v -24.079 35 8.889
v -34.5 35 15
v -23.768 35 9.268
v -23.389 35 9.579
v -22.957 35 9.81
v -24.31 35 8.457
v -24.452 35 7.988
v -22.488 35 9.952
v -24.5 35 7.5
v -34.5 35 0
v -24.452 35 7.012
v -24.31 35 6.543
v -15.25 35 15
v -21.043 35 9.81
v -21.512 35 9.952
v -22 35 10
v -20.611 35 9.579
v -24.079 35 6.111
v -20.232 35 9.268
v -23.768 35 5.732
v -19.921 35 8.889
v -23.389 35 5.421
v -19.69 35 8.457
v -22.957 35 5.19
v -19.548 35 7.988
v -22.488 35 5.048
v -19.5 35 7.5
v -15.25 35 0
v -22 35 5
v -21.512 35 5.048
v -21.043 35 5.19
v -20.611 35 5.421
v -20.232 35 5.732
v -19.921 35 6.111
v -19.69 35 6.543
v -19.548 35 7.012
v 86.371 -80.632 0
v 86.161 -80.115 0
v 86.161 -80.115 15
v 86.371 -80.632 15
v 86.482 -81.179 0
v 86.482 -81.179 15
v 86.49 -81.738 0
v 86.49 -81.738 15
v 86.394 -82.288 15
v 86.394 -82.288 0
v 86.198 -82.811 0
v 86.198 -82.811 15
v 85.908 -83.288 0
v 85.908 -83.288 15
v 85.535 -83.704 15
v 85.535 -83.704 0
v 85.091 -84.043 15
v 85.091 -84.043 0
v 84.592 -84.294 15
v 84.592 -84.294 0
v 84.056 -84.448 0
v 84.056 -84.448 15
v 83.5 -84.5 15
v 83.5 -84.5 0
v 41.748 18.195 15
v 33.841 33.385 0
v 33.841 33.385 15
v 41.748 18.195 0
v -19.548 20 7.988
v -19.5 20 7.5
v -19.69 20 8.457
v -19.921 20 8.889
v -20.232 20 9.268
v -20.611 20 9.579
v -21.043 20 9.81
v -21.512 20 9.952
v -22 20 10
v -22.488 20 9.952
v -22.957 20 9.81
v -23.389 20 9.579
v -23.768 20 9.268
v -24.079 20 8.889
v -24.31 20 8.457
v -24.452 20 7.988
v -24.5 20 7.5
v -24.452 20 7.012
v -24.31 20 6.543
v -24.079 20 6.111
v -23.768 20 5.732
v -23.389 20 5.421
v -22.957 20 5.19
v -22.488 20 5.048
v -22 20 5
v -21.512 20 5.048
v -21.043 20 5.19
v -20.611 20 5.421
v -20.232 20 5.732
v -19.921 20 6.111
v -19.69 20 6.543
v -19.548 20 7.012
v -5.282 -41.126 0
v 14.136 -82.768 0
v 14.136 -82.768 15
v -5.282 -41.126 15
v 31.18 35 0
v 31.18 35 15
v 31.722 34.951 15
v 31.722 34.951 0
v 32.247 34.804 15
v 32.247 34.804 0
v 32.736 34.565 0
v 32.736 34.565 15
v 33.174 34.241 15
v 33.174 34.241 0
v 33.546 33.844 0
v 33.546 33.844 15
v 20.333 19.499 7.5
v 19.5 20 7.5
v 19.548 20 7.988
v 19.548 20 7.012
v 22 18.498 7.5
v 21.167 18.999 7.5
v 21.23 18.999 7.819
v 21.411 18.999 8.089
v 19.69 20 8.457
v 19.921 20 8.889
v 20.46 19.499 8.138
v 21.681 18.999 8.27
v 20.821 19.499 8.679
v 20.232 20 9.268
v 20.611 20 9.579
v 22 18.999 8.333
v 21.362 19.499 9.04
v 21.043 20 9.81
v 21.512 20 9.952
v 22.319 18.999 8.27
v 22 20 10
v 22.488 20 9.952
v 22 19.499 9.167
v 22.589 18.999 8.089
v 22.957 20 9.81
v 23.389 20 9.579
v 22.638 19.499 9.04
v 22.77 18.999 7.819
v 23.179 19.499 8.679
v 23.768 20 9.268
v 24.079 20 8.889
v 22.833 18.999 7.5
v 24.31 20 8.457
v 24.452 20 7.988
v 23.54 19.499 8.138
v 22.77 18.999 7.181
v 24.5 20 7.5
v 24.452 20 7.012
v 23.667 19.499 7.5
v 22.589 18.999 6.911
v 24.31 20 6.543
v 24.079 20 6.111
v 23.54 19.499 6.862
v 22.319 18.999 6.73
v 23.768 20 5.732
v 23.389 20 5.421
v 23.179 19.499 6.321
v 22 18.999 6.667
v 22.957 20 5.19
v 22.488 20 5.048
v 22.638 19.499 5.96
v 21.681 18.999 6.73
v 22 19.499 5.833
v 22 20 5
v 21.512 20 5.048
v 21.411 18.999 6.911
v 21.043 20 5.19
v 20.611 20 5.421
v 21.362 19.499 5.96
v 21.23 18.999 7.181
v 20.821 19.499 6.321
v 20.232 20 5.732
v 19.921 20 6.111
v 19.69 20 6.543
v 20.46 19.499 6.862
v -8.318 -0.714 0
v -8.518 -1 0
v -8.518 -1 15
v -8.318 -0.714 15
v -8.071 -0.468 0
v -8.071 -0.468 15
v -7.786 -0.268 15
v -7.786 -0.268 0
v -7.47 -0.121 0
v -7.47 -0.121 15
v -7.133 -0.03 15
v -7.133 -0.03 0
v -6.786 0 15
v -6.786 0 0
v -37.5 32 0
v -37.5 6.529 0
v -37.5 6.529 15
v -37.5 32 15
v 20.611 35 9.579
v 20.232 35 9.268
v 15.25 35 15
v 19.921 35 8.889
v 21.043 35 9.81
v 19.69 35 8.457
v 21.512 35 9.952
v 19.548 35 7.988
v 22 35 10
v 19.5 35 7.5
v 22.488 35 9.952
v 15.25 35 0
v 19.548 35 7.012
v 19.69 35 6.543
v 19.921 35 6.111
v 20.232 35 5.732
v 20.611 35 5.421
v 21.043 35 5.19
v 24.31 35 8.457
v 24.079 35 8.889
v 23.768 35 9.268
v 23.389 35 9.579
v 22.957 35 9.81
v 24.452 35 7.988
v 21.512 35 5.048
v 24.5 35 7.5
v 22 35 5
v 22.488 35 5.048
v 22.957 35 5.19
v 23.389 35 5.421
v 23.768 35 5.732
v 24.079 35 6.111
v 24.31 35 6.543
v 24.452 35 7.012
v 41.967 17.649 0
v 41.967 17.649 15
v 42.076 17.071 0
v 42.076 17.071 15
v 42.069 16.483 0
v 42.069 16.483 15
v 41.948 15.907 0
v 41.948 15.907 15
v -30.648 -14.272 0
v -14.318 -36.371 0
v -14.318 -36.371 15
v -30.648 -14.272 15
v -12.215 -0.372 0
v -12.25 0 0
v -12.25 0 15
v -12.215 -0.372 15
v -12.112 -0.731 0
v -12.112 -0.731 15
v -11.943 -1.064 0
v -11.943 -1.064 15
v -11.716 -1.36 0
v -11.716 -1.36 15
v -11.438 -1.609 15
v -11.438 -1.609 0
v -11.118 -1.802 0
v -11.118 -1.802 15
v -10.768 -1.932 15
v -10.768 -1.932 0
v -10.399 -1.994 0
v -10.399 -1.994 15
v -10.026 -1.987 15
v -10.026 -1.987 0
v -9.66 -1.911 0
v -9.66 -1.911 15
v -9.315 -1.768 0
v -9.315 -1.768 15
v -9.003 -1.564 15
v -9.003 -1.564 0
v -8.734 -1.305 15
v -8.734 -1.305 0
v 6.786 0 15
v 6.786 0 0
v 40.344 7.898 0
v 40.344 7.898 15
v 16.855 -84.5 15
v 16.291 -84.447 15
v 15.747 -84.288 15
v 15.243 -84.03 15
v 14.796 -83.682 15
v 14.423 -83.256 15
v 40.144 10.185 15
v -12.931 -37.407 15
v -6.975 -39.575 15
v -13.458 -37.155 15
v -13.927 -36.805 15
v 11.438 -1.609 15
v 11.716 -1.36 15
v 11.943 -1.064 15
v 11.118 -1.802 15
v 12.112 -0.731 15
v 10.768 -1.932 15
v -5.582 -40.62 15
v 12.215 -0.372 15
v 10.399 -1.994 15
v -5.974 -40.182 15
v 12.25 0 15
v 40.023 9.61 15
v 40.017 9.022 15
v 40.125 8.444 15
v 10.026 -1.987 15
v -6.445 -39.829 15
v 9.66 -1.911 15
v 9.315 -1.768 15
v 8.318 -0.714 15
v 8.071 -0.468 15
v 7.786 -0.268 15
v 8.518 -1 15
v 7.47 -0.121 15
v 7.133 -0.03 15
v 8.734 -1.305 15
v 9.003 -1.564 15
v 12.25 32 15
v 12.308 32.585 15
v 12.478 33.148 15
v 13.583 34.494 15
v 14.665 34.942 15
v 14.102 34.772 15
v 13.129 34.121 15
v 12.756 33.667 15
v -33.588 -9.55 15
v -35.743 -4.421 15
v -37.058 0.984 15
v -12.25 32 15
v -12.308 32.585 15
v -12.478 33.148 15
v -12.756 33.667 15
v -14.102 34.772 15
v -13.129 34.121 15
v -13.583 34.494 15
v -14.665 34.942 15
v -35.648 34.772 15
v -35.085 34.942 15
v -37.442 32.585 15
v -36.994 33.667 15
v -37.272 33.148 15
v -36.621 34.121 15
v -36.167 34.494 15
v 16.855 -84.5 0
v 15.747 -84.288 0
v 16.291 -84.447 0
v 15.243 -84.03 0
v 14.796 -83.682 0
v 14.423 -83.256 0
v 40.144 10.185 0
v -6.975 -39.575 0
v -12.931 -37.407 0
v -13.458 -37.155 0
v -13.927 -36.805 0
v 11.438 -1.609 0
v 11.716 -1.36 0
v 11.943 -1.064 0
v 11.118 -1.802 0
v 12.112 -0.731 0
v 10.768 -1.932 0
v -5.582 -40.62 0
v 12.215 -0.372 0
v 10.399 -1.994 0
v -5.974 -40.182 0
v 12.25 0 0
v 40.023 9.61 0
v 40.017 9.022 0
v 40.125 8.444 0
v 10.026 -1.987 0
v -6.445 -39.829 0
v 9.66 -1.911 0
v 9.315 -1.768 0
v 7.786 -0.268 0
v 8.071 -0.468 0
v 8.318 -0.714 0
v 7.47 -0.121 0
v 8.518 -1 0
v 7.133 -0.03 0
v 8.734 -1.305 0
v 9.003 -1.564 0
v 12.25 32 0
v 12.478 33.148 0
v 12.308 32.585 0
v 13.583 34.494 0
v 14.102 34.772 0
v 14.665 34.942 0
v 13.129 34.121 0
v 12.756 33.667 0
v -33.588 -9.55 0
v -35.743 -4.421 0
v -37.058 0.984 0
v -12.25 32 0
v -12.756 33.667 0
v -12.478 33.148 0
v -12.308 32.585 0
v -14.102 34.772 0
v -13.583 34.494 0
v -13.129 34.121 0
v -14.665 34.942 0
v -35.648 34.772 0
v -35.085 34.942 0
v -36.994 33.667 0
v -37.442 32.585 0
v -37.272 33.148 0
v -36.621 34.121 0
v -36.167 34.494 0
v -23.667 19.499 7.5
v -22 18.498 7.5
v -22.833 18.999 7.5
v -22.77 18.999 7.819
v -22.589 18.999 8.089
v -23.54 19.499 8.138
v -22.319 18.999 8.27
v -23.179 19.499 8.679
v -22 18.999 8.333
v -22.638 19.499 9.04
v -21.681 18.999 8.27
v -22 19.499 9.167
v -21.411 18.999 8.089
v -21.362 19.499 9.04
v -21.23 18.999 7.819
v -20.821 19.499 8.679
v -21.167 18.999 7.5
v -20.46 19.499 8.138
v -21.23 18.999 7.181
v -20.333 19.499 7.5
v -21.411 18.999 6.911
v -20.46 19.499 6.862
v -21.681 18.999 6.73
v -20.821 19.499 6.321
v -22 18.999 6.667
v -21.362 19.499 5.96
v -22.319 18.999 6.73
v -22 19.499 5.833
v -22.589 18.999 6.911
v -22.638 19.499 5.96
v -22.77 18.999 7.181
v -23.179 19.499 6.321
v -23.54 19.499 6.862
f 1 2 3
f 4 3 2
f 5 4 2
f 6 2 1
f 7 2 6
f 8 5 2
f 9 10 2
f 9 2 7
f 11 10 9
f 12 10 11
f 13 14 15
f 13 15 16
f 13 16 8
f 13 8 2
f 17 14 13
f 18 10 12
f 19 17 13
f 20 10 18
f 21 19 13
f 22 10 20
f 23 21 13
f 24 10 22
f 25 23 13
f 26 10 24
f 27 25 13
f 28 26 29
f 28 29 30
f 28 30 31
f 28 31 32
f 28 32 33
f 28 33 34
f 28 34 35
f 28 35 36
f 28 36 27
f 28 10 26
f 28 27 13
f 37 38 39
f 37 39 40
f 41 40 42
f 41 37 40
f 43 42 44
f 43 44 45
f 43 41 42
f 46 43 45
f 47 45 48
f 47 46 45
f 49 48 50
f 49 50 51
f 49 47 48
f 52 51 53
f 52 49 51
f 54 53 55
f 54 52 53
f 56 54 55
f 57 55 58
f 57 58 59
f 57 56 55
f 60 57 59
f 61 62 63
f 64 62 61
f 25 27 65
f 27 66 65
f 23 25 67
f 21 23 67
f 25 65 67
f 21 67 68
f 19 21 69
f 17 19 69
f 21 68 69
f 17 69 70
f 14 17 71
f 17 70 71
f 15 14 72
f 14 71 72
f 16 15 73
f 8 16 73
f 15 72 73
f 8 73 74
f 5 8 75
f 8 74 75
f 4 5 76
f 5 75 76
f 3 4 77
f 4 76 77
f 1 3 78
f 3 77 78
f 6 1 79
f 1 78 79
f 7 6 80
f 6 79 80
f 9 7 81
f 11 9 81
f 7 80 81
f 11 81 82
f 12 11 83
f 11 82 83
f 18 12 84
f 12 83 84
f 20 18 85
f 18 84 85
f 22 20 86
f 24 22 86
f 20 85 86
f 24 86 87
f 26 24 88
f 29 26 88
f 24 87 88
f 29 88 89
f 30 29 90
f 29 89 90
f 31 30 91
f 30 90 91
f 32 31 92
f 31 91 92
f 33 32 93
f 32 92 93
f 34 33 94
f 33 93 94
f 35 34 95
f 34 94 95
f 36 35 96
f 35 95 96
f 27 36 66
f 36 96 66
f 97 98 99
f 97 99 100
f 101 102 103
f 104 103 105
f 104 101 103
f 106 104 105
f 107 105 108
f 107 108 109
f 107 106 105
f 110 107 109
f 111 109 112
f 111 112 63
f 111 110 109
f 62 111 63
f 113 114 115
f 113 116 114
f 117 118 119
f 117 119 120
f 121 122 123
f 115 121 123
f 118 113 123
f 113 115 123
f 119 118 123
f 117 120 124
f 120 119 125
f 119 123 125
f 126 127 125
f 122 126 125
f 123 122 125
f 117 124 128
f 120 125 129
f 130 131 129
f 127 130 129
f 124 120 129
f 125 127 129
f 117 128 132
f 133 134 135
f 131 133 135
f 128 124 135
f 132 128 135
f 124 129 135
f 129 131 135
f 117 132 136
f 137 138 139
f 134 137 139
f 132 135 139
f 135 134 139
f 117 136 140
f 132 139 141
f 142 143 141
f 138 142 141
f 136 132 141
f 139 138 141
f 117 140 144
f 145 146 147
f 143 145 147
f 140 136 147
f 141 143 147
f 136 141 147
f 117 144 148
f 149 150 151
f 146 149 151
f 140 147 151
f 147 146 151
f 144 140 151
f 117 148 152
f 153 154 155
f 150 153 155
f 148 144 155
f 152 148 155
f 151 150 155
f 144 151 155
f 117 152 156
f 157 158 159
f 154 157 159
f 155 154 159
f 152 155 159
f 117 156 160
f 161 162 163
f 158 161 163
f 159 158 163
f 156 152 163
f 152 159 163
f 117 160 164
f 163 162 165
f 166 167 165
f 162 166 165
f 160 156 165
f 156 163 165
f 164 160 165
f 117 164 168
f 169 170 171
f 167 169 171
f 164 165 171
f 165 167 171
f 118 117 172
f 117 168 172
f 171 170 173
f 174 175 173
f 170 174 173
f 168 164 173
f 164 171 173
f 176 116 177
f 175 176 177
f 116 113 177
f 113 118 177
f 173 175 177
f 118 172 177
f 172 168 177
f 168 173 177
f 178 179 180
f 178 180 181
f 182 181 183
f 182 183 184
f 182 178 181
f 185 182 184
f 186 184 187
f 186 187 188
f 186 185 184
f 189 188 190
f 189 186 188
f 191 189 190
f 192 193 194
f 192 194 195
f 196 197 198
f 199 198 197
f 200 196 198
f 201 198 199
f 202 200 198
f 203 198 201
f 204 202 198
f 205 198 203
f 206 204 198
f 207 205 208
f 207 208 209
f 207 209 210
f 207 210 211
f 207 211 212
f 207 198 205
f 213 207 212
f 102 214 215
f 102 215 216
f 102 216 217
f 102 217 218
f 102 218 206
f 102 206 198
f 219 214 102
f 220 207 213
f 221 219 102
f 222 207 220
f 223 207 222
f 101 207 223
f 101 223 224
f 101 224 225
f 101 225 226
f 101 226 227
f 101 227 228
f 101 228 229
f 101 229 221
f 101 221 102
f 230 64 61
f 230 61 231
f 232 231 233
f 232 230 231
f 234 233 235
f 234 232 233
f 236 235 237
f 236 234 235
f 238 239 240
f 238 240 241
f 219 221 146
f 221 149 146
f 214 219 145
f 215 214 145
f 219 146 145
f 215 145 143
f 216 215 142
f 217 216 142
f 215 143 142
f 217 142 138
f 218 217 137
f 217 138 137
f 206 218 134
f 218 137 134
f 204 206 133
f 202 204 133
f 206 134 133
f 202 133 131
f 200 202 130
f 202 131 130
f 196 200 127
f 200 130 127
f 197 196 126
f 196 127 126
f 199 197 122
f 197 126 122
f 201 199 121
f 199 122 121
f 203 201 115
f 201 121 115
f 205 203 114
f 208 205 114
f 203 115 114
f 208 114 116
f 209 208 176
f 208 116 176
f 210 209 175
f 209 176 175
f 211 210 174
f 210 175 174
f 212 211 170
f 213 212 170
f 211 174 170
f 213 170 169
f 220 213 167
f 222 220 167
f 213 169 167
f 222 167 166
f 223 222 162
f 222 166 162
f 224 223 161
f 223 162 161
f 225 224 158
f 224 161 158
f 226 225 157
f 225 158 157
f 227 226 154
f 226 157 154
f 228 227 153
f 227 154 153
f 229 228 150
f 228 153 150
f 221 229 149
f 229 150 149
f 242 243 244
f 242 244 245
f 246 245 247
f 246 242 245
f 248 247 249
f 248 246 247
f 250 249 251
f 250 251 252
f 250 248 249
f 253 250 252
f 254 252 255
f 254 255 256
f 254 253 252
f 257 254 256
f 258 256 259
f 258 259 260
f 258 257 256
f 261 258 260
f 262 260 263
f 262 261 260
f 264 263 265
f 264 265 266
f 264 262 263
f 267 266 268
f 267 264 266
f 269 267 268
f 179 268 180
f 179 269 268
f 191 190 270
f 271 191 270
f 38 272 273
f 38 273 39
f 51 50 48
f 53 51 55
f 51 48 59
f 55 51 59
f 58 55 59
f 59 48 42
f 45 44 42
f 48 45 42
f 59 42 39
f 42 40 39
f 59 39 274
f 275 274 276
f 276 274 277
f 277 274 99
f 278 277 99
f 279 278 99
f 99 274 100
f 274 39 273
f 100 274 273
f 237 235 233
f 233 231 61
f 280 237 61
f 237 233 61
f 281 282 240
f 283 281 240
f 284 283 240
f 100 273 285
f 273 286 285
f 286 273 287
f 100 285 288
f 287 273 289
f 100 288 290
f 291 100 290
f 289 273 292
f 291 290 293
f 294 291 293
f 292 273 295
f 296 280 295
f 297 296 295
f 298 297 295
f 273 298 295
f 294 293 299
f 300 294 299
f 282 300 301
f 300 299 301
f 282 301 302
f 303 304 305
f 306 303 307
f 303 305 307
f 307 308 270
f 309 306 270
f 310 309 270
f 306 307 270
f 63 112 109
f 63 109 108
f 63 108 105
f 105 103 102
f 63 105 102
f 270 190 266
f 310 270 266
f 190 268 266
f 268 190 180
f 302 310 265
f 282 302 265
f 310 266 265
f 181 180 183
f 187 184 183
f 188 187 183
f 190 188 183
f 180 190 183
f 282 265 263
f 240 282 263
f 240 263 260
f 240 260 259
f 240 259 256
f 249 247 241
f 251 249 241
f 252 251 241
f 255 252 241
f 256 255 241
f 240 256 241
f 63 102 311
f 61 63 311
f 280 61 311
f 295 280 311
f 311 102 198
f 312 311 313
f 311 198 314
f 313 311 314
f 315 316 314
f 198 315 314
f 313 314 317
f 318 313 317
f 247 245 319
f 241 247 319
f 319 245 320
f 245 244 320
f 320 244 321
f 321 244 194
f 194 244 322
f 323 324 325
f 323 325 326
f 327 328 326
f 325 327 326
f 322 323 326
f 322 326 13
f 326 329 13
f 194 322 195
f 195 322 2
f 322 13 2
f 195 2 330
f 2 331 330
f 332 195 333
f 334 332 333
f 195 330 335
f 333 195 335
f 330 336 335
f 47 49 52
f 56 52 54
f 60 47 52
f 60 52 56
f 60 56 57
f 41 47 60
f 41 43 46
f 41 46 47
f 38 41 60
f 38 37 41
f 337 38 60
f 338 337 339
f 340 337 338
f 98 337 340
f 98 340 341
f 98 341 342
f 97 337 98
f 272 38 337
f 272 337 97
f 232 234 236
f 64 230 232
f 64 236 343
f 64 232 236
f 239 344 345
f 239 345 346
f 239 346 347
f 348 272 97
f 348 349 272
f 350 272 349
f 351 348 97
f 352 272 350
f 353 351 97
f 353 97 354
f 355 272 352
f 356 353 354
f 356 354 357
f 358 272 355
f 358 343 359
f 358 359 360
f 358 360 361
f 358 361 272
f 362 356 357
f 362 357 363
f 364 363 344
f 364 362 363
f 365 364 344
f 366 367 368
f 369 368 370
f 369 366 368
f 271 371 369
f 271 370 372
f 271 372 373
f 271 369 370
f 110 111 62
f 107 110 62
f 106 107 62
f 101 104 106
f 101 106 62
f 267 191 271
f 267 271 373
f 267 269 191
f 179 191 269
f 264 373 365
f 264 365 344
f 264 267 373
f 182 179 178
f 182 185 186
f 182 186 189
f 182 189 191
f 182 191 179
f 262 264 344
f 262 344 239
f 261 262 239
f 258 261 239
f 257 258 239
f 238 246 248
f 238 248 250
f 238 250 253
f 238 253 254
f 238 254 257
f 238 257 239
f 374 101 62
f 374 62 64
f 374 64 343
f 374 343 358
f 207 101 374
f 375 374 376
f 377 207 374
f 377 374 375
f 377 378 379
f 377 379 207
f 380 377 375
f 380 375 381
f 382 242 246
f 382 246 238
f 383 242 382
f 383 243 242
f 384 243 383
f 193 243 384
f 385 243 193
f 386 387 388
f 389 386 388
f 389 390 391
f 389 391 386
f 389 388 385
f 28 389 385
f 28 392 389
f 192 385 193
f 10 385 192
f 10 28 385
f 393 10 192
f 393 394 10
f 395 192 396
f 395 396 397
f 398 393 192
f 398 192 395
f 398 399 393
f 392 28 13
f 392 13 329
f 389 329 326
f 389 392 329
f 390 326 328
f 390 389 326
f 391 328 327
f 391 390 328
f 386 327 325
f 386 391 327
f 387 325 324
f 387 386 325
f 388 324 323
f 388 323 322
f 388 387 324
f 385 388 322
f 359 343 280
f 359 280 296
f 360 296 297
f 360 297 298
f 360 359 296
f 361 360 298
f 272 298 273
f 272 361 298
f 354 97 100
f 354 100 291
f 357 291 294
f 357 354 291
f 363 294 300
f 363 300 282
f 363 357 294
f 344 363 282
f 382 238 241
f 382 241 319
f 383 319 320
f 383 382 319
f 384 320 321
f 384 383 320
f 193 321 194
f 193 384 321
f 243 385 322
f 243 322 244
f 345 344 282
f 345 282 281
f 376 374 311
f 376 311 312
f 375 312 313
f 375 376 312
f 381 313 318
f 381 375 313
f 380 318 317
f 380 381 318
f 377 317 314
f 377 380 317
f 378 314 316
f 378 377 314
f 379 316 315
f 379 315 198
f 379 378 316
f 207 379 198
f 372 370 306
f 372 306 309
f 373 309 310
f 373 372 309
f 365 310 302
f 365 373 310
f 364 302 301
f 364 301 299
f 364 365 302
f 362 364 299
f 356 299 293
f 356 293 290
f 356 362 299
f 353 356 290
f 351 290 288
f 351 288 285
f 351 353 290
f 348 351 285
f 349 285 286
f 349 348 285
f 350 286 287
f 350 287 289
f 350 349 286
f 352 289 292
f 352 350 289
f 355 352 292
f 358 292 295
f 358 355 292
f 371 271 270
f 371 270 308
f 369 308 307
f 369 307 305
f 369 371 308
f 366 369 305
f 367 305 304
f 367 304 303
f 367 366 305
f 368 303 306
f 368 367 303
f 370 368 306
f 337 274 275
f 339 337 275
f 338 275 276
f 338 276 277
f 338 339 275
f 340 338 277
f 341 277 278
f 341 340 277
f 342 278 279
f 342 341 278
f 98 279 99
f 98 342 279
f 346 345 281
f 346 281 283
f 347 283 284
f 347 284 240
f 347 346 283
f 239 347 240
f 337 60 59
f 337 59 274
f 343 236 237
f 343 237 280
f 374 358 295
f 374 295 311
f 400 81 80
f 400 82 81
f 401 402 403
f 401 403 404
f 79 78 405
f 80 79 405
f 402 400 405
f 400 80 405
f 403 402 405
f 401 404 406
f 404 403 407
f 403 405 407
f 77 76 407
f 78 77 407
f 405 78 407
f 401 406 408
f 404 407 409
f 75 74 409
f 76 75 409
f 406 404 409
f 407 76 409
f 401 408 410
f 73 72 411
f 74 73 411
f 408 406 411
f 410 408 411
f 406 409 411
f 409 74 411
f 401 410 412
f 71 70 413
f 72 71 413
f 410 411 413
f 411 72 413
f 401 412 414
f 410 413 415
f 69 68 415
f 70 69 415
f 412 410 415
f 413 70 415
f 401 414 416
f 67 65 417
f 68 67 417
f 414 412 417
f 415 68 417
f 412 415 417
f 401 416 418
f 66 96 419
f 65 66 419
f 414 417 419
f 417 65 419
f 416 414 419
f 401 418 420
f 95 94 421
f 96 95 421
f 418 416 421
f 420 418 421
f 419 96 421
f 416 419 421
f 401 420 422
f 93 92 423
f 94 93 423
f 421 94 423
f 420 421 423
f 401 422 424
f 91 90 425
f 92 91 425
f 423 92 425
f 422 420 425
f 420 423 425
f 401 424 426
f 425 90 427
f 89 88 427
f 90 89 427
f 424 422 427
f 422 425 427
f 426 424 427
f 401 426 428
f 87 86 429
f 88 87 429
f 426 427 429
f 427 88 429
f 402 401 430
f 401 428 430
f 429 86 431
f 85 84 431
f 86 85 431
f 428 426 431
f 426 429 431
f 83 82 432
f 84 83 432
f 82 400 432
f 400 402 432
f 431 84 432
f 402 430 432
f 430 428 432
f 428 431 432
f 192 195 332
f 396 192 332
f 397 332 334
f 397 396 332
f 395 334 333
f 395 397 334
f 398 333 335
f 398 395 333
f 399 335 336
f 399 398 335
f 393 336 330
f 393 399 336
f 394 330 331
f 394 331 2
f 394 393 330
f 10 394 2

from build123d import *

# Parameters (mm, degrees)
EXTRUDE1_DEPTH = 15
HOLE1_D        = 5
HOLE1_DEPTH    = 15
HOLE1_TIP      = 1.502151548


with BuildPart() as part:
    # Sketch1 → Extrude1 (new body)
    with BuildSketch(Plane.XY):
        with BuildLine():
            Line((-6.785898385, 0), (6.785898385, 0))
            ThreePointArc((6.785898385, 0), (7.785898385, -0.267949192), (8.517949192, -1))
            ThreePointArc((8.517949192, -1), (10.76763809, -1.931851653), (12.25, 0))
            Line((12.25, 0), (12.25, 32))
            ThreePointArc((12.25, 32), (13.128679656, 34.121320344), (15.25, 35))
            Line((15.25, 35), (31.179555311, 35))
            ThreePointArc((31.179555311, 35), (32.735875086, 34.564735612), (33.840587811, 33.38524584))
            Line((33.840587811, 33.38524584), (41.748237339, 18.19479243))
            ThreePointArc((41.748237339, 18.19479243), (42.075788934, 17.071013818), (41.948355691, 15.907429191))
            Line((41.948355691, 15.907429191), (40.144120894, 10.185127487))
            ThreePointArc((40.144120894, 10.185127487), (40.016687652, 9.02154286), (40.344239247, 7.897764249))
            Line((40.344239247, 7.897764249), (86.160656367, -80.11475416))
            ThreePointArc((86.160656367, -80.11475416), (86.064359479, -83.056319774), (83.499623867, -84.5))
            Line((83.499623867, -84.5), (16.854681642, -84.5))
            ThreePointArc((16.854681642, -84.5), (15.242782817, -84.030174337), (14.135758281, -82.767854785))
            Line((14.135758281, -82.767854785), (-5.282057281, -41.126214931))
            ThreePointArc((-5.282057281, -41.126214931), (-5.974210019, -40.182237706), (-6.974920212, -39.574991854))
            Line((-6.974920212, -39.574991854), (-12.931340914, -37.407032016))
            ThreePointArc((-12.931340914, -37.407032016), (-13.701027508, -36.991138005), (-14.317998731, -36.370870489))
            Line((-14.317998731, -36.370870489), (-30.648379548, -14.271904325))
            ThreePointArc((-30.648379548, -14.271904325), (-35.74299388, -4.421252914), (-37.5, 6.52878626))
            Line((-37.5, 6.52878626), (-37.5, 32))
            ThreePointArc((-37.5, 32), (-36.621320344, 34.121320344), (-34.5, 35))
            Line((-34.5, 35), (-15.25, 35))
            ThreePointArc((-15.25, 35), (-13.128679656, 34.121320344), (-12.25, 32))
            Line((-12.25, 32), (-12.25, 0))
            ThreePointArc((-12.25, 0), (-10.76763809, -1.931851653), (-8.517949192, -1))
            ThreePointArc((-8.517949192, -1), (-7.785898385, -0.267949192), (-6.785898385, 0))
        make_face()
    extrude(amount=EXTRUDE1_DEPTH)

    # Hole1
    with Locations(Plane(origin=(0, 35, 0), x_dir=(-1, 0, 0), z_dir=(0, 1, 0))):
        with Locations((-22, 7.5), (22, 7.5)):
            Hole(HOLE1_D / 2, depth=HOLE1_DEPTH)
            with Locations((0, 0, -(HOLE1_DEPTH + HOLE1_TIP / 2))):  # 118° drill point
                Cone(0, HOLE1_D / 2, HOLE1_TIP, mode=Mode.SUBTRACT)


solid = part.part
